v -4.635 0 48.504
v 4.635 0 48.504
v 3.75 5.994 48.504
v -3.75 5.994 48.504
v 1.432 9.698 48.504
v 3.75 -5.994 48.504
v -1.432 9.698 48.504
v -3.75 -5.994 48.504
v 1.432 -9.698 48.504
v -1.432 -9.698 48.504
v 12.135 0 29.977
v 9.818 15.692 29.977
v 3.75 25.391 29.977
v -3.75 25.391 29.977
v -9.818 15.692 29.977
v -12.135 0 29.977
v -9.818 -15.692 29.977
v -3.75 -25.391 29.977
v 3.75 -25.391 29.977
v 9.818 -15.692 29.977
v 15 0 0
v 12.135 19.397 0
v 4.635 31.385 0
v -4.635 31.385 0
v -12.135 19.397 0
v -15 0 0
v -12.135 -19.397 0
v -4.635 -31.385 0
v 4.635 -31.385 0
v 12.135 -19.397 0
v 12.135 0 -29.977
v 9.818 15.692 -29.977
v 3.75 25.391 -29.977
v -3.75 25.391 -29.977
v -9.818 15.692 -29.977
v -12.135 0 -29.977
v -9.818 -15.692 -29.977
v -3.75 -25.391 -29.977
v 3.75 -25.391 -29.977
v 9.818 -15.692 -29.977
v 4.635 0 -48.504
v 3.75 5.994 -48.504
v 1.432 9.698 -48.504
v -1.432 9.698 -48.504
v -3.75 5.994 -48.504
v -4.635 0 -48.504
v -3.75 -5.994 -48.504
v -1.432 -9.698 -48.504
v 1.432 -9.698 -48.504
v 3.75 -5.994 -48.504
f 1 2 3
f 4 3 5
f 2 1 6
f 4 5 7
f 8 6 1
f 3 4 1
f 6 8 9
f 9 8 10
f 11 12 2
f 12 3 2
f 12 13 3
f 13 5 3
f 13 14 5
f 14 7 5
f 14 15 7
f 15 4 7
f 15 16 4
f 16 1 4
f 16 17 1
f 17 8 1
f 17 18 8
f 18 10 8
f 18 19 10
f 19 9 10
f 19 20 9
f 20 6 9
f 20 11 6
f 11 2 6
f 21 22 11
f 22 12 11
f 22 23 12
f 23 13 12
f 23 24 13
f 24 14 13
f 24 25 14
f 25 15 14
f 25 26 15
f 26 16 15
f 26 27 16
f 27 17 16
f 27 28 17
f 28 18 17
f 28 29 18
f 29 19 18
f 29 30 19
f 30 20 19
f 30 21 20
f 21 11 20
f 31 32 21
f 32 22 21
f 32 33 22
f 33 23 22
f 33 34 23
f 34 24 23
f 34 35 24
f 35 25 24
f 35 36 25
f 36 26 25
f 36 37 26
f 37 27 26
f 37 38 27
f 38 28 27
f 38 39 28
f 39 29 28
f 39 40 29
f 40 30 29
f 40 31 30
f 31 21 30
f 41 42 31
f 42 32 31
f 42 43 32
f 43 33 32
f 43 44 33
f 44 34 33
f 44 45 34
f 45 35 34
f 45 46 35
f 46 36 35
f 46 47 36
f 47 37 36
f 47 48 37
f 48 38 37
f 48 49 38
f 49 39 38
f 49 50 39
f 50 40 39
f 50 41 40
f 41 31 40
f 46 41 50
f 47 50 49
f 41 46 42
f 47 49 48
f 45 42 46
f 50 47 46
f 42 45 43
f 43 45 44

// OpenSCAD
// Generated by SolidPython 1.0.1 on 2020-07-29 00:46:46


scale(v = [5, 11, 17]) {
	sphere(r = 3);
}
/***********************************************
*********      SolidPython code:      **********
************************************************
 
# import packages: SolidPython
from solid import *
from solid.utils import *
from itertools import chain, combinations, permutations


class Resize:

    def __init__(self, scad_file):
        self.scad_file = scad_file
        #self.scad_file = import_scad(scad_file)
        # cone/cylinder param:
        self.r1 = 0
        self.r2 = 0
        self.h = 0
        # rectangular prism param:
        self.w = 0
        self.l = 0
        # ellipse param:
        self.r = 0

    # import OpenScad code (file name corresponds to shape)


    # classify shape + parameters
    def assign(self, param1, param2, param3):
        if self.scad_file == 'cone.scad':
            self.r1 = param1
            self.r2 = param2
            self.h = param3
        elif self.scad_file == 'cylinder.scad':
            self.r1 = param1
            self.r2 = param2
            self.h = param3
        elif self.scad_file == 'rectangularPrism.scad':
            self.h = param1
            self.l = param2
            self.w = param3
        else:
            self.r = param1
            self.h = param2

    # resize parameters
    def iterate(self):
        x = range(3, 20, 2)
        i = 1
        if self.scad_file == 'cone.scad':
            tempList = list(permutations(x, 2))
            for temp in tempList:
                param1 = temp[0]
                param2 = temp[1]
                filepath = 'produced_scad_files/' + 'cone' + str(param1) + '_' + str(param2) + '_' + '.scad'
                scad_render_to_file(cylinder(h=param1, r1=param2, r2=0), filepath)

        elif self.scad_file == 'cylinder.scad':
            tempList = list(permutations(x, 3))
            for temp in tempList:
                param1 = temp[0]
                param2 = temp[1]
                filepath = 'produced_scad_files/' + 'cylinder' + str(param1) + '_' + str(param2) + '_' + '.scad'
                scad_render_to_file(cylinder(h=param1, r1=param2, r2=param2), filepath)

        elif self.scad_file == 'rectangularPrism.scad':
            tempList = list(permutations(x, 3))
            for temp in tempList:
                param1 = temp[0]
                param2 = temp[1]
                param3 = temp[2]
                filepath = 'produced_scad_files/' + 'rectangularPrism' + str(param1) + '_' + str(param2) + '_' + str(
                    param3) + '.scad'
                scad_render_to_file(cube(size=(param1, param2, param3)), filepath)

        elif self.scad_file == 'ellipse.scad':
            tempList = list(permutations(x, 4))
            for temp in tempList:
                param1 = temp[0]
                param2 = temp[1]
                param3 = temp[2]
                param4 = temp[3]
                filepath = 'produced_scad_files/' + 'ellipse' + str(param1) + '_' + str(param2) + '_' + str(param3) + '_' + str(param4) + '.scad'
                scad_render_to_file(scale([param1, param2, param3])(sphere(r=param4)), filepath)

    def render_to_scadfile(self):
        scad_render_to_file(scad, 'example.scad') 
 
************************************************/
